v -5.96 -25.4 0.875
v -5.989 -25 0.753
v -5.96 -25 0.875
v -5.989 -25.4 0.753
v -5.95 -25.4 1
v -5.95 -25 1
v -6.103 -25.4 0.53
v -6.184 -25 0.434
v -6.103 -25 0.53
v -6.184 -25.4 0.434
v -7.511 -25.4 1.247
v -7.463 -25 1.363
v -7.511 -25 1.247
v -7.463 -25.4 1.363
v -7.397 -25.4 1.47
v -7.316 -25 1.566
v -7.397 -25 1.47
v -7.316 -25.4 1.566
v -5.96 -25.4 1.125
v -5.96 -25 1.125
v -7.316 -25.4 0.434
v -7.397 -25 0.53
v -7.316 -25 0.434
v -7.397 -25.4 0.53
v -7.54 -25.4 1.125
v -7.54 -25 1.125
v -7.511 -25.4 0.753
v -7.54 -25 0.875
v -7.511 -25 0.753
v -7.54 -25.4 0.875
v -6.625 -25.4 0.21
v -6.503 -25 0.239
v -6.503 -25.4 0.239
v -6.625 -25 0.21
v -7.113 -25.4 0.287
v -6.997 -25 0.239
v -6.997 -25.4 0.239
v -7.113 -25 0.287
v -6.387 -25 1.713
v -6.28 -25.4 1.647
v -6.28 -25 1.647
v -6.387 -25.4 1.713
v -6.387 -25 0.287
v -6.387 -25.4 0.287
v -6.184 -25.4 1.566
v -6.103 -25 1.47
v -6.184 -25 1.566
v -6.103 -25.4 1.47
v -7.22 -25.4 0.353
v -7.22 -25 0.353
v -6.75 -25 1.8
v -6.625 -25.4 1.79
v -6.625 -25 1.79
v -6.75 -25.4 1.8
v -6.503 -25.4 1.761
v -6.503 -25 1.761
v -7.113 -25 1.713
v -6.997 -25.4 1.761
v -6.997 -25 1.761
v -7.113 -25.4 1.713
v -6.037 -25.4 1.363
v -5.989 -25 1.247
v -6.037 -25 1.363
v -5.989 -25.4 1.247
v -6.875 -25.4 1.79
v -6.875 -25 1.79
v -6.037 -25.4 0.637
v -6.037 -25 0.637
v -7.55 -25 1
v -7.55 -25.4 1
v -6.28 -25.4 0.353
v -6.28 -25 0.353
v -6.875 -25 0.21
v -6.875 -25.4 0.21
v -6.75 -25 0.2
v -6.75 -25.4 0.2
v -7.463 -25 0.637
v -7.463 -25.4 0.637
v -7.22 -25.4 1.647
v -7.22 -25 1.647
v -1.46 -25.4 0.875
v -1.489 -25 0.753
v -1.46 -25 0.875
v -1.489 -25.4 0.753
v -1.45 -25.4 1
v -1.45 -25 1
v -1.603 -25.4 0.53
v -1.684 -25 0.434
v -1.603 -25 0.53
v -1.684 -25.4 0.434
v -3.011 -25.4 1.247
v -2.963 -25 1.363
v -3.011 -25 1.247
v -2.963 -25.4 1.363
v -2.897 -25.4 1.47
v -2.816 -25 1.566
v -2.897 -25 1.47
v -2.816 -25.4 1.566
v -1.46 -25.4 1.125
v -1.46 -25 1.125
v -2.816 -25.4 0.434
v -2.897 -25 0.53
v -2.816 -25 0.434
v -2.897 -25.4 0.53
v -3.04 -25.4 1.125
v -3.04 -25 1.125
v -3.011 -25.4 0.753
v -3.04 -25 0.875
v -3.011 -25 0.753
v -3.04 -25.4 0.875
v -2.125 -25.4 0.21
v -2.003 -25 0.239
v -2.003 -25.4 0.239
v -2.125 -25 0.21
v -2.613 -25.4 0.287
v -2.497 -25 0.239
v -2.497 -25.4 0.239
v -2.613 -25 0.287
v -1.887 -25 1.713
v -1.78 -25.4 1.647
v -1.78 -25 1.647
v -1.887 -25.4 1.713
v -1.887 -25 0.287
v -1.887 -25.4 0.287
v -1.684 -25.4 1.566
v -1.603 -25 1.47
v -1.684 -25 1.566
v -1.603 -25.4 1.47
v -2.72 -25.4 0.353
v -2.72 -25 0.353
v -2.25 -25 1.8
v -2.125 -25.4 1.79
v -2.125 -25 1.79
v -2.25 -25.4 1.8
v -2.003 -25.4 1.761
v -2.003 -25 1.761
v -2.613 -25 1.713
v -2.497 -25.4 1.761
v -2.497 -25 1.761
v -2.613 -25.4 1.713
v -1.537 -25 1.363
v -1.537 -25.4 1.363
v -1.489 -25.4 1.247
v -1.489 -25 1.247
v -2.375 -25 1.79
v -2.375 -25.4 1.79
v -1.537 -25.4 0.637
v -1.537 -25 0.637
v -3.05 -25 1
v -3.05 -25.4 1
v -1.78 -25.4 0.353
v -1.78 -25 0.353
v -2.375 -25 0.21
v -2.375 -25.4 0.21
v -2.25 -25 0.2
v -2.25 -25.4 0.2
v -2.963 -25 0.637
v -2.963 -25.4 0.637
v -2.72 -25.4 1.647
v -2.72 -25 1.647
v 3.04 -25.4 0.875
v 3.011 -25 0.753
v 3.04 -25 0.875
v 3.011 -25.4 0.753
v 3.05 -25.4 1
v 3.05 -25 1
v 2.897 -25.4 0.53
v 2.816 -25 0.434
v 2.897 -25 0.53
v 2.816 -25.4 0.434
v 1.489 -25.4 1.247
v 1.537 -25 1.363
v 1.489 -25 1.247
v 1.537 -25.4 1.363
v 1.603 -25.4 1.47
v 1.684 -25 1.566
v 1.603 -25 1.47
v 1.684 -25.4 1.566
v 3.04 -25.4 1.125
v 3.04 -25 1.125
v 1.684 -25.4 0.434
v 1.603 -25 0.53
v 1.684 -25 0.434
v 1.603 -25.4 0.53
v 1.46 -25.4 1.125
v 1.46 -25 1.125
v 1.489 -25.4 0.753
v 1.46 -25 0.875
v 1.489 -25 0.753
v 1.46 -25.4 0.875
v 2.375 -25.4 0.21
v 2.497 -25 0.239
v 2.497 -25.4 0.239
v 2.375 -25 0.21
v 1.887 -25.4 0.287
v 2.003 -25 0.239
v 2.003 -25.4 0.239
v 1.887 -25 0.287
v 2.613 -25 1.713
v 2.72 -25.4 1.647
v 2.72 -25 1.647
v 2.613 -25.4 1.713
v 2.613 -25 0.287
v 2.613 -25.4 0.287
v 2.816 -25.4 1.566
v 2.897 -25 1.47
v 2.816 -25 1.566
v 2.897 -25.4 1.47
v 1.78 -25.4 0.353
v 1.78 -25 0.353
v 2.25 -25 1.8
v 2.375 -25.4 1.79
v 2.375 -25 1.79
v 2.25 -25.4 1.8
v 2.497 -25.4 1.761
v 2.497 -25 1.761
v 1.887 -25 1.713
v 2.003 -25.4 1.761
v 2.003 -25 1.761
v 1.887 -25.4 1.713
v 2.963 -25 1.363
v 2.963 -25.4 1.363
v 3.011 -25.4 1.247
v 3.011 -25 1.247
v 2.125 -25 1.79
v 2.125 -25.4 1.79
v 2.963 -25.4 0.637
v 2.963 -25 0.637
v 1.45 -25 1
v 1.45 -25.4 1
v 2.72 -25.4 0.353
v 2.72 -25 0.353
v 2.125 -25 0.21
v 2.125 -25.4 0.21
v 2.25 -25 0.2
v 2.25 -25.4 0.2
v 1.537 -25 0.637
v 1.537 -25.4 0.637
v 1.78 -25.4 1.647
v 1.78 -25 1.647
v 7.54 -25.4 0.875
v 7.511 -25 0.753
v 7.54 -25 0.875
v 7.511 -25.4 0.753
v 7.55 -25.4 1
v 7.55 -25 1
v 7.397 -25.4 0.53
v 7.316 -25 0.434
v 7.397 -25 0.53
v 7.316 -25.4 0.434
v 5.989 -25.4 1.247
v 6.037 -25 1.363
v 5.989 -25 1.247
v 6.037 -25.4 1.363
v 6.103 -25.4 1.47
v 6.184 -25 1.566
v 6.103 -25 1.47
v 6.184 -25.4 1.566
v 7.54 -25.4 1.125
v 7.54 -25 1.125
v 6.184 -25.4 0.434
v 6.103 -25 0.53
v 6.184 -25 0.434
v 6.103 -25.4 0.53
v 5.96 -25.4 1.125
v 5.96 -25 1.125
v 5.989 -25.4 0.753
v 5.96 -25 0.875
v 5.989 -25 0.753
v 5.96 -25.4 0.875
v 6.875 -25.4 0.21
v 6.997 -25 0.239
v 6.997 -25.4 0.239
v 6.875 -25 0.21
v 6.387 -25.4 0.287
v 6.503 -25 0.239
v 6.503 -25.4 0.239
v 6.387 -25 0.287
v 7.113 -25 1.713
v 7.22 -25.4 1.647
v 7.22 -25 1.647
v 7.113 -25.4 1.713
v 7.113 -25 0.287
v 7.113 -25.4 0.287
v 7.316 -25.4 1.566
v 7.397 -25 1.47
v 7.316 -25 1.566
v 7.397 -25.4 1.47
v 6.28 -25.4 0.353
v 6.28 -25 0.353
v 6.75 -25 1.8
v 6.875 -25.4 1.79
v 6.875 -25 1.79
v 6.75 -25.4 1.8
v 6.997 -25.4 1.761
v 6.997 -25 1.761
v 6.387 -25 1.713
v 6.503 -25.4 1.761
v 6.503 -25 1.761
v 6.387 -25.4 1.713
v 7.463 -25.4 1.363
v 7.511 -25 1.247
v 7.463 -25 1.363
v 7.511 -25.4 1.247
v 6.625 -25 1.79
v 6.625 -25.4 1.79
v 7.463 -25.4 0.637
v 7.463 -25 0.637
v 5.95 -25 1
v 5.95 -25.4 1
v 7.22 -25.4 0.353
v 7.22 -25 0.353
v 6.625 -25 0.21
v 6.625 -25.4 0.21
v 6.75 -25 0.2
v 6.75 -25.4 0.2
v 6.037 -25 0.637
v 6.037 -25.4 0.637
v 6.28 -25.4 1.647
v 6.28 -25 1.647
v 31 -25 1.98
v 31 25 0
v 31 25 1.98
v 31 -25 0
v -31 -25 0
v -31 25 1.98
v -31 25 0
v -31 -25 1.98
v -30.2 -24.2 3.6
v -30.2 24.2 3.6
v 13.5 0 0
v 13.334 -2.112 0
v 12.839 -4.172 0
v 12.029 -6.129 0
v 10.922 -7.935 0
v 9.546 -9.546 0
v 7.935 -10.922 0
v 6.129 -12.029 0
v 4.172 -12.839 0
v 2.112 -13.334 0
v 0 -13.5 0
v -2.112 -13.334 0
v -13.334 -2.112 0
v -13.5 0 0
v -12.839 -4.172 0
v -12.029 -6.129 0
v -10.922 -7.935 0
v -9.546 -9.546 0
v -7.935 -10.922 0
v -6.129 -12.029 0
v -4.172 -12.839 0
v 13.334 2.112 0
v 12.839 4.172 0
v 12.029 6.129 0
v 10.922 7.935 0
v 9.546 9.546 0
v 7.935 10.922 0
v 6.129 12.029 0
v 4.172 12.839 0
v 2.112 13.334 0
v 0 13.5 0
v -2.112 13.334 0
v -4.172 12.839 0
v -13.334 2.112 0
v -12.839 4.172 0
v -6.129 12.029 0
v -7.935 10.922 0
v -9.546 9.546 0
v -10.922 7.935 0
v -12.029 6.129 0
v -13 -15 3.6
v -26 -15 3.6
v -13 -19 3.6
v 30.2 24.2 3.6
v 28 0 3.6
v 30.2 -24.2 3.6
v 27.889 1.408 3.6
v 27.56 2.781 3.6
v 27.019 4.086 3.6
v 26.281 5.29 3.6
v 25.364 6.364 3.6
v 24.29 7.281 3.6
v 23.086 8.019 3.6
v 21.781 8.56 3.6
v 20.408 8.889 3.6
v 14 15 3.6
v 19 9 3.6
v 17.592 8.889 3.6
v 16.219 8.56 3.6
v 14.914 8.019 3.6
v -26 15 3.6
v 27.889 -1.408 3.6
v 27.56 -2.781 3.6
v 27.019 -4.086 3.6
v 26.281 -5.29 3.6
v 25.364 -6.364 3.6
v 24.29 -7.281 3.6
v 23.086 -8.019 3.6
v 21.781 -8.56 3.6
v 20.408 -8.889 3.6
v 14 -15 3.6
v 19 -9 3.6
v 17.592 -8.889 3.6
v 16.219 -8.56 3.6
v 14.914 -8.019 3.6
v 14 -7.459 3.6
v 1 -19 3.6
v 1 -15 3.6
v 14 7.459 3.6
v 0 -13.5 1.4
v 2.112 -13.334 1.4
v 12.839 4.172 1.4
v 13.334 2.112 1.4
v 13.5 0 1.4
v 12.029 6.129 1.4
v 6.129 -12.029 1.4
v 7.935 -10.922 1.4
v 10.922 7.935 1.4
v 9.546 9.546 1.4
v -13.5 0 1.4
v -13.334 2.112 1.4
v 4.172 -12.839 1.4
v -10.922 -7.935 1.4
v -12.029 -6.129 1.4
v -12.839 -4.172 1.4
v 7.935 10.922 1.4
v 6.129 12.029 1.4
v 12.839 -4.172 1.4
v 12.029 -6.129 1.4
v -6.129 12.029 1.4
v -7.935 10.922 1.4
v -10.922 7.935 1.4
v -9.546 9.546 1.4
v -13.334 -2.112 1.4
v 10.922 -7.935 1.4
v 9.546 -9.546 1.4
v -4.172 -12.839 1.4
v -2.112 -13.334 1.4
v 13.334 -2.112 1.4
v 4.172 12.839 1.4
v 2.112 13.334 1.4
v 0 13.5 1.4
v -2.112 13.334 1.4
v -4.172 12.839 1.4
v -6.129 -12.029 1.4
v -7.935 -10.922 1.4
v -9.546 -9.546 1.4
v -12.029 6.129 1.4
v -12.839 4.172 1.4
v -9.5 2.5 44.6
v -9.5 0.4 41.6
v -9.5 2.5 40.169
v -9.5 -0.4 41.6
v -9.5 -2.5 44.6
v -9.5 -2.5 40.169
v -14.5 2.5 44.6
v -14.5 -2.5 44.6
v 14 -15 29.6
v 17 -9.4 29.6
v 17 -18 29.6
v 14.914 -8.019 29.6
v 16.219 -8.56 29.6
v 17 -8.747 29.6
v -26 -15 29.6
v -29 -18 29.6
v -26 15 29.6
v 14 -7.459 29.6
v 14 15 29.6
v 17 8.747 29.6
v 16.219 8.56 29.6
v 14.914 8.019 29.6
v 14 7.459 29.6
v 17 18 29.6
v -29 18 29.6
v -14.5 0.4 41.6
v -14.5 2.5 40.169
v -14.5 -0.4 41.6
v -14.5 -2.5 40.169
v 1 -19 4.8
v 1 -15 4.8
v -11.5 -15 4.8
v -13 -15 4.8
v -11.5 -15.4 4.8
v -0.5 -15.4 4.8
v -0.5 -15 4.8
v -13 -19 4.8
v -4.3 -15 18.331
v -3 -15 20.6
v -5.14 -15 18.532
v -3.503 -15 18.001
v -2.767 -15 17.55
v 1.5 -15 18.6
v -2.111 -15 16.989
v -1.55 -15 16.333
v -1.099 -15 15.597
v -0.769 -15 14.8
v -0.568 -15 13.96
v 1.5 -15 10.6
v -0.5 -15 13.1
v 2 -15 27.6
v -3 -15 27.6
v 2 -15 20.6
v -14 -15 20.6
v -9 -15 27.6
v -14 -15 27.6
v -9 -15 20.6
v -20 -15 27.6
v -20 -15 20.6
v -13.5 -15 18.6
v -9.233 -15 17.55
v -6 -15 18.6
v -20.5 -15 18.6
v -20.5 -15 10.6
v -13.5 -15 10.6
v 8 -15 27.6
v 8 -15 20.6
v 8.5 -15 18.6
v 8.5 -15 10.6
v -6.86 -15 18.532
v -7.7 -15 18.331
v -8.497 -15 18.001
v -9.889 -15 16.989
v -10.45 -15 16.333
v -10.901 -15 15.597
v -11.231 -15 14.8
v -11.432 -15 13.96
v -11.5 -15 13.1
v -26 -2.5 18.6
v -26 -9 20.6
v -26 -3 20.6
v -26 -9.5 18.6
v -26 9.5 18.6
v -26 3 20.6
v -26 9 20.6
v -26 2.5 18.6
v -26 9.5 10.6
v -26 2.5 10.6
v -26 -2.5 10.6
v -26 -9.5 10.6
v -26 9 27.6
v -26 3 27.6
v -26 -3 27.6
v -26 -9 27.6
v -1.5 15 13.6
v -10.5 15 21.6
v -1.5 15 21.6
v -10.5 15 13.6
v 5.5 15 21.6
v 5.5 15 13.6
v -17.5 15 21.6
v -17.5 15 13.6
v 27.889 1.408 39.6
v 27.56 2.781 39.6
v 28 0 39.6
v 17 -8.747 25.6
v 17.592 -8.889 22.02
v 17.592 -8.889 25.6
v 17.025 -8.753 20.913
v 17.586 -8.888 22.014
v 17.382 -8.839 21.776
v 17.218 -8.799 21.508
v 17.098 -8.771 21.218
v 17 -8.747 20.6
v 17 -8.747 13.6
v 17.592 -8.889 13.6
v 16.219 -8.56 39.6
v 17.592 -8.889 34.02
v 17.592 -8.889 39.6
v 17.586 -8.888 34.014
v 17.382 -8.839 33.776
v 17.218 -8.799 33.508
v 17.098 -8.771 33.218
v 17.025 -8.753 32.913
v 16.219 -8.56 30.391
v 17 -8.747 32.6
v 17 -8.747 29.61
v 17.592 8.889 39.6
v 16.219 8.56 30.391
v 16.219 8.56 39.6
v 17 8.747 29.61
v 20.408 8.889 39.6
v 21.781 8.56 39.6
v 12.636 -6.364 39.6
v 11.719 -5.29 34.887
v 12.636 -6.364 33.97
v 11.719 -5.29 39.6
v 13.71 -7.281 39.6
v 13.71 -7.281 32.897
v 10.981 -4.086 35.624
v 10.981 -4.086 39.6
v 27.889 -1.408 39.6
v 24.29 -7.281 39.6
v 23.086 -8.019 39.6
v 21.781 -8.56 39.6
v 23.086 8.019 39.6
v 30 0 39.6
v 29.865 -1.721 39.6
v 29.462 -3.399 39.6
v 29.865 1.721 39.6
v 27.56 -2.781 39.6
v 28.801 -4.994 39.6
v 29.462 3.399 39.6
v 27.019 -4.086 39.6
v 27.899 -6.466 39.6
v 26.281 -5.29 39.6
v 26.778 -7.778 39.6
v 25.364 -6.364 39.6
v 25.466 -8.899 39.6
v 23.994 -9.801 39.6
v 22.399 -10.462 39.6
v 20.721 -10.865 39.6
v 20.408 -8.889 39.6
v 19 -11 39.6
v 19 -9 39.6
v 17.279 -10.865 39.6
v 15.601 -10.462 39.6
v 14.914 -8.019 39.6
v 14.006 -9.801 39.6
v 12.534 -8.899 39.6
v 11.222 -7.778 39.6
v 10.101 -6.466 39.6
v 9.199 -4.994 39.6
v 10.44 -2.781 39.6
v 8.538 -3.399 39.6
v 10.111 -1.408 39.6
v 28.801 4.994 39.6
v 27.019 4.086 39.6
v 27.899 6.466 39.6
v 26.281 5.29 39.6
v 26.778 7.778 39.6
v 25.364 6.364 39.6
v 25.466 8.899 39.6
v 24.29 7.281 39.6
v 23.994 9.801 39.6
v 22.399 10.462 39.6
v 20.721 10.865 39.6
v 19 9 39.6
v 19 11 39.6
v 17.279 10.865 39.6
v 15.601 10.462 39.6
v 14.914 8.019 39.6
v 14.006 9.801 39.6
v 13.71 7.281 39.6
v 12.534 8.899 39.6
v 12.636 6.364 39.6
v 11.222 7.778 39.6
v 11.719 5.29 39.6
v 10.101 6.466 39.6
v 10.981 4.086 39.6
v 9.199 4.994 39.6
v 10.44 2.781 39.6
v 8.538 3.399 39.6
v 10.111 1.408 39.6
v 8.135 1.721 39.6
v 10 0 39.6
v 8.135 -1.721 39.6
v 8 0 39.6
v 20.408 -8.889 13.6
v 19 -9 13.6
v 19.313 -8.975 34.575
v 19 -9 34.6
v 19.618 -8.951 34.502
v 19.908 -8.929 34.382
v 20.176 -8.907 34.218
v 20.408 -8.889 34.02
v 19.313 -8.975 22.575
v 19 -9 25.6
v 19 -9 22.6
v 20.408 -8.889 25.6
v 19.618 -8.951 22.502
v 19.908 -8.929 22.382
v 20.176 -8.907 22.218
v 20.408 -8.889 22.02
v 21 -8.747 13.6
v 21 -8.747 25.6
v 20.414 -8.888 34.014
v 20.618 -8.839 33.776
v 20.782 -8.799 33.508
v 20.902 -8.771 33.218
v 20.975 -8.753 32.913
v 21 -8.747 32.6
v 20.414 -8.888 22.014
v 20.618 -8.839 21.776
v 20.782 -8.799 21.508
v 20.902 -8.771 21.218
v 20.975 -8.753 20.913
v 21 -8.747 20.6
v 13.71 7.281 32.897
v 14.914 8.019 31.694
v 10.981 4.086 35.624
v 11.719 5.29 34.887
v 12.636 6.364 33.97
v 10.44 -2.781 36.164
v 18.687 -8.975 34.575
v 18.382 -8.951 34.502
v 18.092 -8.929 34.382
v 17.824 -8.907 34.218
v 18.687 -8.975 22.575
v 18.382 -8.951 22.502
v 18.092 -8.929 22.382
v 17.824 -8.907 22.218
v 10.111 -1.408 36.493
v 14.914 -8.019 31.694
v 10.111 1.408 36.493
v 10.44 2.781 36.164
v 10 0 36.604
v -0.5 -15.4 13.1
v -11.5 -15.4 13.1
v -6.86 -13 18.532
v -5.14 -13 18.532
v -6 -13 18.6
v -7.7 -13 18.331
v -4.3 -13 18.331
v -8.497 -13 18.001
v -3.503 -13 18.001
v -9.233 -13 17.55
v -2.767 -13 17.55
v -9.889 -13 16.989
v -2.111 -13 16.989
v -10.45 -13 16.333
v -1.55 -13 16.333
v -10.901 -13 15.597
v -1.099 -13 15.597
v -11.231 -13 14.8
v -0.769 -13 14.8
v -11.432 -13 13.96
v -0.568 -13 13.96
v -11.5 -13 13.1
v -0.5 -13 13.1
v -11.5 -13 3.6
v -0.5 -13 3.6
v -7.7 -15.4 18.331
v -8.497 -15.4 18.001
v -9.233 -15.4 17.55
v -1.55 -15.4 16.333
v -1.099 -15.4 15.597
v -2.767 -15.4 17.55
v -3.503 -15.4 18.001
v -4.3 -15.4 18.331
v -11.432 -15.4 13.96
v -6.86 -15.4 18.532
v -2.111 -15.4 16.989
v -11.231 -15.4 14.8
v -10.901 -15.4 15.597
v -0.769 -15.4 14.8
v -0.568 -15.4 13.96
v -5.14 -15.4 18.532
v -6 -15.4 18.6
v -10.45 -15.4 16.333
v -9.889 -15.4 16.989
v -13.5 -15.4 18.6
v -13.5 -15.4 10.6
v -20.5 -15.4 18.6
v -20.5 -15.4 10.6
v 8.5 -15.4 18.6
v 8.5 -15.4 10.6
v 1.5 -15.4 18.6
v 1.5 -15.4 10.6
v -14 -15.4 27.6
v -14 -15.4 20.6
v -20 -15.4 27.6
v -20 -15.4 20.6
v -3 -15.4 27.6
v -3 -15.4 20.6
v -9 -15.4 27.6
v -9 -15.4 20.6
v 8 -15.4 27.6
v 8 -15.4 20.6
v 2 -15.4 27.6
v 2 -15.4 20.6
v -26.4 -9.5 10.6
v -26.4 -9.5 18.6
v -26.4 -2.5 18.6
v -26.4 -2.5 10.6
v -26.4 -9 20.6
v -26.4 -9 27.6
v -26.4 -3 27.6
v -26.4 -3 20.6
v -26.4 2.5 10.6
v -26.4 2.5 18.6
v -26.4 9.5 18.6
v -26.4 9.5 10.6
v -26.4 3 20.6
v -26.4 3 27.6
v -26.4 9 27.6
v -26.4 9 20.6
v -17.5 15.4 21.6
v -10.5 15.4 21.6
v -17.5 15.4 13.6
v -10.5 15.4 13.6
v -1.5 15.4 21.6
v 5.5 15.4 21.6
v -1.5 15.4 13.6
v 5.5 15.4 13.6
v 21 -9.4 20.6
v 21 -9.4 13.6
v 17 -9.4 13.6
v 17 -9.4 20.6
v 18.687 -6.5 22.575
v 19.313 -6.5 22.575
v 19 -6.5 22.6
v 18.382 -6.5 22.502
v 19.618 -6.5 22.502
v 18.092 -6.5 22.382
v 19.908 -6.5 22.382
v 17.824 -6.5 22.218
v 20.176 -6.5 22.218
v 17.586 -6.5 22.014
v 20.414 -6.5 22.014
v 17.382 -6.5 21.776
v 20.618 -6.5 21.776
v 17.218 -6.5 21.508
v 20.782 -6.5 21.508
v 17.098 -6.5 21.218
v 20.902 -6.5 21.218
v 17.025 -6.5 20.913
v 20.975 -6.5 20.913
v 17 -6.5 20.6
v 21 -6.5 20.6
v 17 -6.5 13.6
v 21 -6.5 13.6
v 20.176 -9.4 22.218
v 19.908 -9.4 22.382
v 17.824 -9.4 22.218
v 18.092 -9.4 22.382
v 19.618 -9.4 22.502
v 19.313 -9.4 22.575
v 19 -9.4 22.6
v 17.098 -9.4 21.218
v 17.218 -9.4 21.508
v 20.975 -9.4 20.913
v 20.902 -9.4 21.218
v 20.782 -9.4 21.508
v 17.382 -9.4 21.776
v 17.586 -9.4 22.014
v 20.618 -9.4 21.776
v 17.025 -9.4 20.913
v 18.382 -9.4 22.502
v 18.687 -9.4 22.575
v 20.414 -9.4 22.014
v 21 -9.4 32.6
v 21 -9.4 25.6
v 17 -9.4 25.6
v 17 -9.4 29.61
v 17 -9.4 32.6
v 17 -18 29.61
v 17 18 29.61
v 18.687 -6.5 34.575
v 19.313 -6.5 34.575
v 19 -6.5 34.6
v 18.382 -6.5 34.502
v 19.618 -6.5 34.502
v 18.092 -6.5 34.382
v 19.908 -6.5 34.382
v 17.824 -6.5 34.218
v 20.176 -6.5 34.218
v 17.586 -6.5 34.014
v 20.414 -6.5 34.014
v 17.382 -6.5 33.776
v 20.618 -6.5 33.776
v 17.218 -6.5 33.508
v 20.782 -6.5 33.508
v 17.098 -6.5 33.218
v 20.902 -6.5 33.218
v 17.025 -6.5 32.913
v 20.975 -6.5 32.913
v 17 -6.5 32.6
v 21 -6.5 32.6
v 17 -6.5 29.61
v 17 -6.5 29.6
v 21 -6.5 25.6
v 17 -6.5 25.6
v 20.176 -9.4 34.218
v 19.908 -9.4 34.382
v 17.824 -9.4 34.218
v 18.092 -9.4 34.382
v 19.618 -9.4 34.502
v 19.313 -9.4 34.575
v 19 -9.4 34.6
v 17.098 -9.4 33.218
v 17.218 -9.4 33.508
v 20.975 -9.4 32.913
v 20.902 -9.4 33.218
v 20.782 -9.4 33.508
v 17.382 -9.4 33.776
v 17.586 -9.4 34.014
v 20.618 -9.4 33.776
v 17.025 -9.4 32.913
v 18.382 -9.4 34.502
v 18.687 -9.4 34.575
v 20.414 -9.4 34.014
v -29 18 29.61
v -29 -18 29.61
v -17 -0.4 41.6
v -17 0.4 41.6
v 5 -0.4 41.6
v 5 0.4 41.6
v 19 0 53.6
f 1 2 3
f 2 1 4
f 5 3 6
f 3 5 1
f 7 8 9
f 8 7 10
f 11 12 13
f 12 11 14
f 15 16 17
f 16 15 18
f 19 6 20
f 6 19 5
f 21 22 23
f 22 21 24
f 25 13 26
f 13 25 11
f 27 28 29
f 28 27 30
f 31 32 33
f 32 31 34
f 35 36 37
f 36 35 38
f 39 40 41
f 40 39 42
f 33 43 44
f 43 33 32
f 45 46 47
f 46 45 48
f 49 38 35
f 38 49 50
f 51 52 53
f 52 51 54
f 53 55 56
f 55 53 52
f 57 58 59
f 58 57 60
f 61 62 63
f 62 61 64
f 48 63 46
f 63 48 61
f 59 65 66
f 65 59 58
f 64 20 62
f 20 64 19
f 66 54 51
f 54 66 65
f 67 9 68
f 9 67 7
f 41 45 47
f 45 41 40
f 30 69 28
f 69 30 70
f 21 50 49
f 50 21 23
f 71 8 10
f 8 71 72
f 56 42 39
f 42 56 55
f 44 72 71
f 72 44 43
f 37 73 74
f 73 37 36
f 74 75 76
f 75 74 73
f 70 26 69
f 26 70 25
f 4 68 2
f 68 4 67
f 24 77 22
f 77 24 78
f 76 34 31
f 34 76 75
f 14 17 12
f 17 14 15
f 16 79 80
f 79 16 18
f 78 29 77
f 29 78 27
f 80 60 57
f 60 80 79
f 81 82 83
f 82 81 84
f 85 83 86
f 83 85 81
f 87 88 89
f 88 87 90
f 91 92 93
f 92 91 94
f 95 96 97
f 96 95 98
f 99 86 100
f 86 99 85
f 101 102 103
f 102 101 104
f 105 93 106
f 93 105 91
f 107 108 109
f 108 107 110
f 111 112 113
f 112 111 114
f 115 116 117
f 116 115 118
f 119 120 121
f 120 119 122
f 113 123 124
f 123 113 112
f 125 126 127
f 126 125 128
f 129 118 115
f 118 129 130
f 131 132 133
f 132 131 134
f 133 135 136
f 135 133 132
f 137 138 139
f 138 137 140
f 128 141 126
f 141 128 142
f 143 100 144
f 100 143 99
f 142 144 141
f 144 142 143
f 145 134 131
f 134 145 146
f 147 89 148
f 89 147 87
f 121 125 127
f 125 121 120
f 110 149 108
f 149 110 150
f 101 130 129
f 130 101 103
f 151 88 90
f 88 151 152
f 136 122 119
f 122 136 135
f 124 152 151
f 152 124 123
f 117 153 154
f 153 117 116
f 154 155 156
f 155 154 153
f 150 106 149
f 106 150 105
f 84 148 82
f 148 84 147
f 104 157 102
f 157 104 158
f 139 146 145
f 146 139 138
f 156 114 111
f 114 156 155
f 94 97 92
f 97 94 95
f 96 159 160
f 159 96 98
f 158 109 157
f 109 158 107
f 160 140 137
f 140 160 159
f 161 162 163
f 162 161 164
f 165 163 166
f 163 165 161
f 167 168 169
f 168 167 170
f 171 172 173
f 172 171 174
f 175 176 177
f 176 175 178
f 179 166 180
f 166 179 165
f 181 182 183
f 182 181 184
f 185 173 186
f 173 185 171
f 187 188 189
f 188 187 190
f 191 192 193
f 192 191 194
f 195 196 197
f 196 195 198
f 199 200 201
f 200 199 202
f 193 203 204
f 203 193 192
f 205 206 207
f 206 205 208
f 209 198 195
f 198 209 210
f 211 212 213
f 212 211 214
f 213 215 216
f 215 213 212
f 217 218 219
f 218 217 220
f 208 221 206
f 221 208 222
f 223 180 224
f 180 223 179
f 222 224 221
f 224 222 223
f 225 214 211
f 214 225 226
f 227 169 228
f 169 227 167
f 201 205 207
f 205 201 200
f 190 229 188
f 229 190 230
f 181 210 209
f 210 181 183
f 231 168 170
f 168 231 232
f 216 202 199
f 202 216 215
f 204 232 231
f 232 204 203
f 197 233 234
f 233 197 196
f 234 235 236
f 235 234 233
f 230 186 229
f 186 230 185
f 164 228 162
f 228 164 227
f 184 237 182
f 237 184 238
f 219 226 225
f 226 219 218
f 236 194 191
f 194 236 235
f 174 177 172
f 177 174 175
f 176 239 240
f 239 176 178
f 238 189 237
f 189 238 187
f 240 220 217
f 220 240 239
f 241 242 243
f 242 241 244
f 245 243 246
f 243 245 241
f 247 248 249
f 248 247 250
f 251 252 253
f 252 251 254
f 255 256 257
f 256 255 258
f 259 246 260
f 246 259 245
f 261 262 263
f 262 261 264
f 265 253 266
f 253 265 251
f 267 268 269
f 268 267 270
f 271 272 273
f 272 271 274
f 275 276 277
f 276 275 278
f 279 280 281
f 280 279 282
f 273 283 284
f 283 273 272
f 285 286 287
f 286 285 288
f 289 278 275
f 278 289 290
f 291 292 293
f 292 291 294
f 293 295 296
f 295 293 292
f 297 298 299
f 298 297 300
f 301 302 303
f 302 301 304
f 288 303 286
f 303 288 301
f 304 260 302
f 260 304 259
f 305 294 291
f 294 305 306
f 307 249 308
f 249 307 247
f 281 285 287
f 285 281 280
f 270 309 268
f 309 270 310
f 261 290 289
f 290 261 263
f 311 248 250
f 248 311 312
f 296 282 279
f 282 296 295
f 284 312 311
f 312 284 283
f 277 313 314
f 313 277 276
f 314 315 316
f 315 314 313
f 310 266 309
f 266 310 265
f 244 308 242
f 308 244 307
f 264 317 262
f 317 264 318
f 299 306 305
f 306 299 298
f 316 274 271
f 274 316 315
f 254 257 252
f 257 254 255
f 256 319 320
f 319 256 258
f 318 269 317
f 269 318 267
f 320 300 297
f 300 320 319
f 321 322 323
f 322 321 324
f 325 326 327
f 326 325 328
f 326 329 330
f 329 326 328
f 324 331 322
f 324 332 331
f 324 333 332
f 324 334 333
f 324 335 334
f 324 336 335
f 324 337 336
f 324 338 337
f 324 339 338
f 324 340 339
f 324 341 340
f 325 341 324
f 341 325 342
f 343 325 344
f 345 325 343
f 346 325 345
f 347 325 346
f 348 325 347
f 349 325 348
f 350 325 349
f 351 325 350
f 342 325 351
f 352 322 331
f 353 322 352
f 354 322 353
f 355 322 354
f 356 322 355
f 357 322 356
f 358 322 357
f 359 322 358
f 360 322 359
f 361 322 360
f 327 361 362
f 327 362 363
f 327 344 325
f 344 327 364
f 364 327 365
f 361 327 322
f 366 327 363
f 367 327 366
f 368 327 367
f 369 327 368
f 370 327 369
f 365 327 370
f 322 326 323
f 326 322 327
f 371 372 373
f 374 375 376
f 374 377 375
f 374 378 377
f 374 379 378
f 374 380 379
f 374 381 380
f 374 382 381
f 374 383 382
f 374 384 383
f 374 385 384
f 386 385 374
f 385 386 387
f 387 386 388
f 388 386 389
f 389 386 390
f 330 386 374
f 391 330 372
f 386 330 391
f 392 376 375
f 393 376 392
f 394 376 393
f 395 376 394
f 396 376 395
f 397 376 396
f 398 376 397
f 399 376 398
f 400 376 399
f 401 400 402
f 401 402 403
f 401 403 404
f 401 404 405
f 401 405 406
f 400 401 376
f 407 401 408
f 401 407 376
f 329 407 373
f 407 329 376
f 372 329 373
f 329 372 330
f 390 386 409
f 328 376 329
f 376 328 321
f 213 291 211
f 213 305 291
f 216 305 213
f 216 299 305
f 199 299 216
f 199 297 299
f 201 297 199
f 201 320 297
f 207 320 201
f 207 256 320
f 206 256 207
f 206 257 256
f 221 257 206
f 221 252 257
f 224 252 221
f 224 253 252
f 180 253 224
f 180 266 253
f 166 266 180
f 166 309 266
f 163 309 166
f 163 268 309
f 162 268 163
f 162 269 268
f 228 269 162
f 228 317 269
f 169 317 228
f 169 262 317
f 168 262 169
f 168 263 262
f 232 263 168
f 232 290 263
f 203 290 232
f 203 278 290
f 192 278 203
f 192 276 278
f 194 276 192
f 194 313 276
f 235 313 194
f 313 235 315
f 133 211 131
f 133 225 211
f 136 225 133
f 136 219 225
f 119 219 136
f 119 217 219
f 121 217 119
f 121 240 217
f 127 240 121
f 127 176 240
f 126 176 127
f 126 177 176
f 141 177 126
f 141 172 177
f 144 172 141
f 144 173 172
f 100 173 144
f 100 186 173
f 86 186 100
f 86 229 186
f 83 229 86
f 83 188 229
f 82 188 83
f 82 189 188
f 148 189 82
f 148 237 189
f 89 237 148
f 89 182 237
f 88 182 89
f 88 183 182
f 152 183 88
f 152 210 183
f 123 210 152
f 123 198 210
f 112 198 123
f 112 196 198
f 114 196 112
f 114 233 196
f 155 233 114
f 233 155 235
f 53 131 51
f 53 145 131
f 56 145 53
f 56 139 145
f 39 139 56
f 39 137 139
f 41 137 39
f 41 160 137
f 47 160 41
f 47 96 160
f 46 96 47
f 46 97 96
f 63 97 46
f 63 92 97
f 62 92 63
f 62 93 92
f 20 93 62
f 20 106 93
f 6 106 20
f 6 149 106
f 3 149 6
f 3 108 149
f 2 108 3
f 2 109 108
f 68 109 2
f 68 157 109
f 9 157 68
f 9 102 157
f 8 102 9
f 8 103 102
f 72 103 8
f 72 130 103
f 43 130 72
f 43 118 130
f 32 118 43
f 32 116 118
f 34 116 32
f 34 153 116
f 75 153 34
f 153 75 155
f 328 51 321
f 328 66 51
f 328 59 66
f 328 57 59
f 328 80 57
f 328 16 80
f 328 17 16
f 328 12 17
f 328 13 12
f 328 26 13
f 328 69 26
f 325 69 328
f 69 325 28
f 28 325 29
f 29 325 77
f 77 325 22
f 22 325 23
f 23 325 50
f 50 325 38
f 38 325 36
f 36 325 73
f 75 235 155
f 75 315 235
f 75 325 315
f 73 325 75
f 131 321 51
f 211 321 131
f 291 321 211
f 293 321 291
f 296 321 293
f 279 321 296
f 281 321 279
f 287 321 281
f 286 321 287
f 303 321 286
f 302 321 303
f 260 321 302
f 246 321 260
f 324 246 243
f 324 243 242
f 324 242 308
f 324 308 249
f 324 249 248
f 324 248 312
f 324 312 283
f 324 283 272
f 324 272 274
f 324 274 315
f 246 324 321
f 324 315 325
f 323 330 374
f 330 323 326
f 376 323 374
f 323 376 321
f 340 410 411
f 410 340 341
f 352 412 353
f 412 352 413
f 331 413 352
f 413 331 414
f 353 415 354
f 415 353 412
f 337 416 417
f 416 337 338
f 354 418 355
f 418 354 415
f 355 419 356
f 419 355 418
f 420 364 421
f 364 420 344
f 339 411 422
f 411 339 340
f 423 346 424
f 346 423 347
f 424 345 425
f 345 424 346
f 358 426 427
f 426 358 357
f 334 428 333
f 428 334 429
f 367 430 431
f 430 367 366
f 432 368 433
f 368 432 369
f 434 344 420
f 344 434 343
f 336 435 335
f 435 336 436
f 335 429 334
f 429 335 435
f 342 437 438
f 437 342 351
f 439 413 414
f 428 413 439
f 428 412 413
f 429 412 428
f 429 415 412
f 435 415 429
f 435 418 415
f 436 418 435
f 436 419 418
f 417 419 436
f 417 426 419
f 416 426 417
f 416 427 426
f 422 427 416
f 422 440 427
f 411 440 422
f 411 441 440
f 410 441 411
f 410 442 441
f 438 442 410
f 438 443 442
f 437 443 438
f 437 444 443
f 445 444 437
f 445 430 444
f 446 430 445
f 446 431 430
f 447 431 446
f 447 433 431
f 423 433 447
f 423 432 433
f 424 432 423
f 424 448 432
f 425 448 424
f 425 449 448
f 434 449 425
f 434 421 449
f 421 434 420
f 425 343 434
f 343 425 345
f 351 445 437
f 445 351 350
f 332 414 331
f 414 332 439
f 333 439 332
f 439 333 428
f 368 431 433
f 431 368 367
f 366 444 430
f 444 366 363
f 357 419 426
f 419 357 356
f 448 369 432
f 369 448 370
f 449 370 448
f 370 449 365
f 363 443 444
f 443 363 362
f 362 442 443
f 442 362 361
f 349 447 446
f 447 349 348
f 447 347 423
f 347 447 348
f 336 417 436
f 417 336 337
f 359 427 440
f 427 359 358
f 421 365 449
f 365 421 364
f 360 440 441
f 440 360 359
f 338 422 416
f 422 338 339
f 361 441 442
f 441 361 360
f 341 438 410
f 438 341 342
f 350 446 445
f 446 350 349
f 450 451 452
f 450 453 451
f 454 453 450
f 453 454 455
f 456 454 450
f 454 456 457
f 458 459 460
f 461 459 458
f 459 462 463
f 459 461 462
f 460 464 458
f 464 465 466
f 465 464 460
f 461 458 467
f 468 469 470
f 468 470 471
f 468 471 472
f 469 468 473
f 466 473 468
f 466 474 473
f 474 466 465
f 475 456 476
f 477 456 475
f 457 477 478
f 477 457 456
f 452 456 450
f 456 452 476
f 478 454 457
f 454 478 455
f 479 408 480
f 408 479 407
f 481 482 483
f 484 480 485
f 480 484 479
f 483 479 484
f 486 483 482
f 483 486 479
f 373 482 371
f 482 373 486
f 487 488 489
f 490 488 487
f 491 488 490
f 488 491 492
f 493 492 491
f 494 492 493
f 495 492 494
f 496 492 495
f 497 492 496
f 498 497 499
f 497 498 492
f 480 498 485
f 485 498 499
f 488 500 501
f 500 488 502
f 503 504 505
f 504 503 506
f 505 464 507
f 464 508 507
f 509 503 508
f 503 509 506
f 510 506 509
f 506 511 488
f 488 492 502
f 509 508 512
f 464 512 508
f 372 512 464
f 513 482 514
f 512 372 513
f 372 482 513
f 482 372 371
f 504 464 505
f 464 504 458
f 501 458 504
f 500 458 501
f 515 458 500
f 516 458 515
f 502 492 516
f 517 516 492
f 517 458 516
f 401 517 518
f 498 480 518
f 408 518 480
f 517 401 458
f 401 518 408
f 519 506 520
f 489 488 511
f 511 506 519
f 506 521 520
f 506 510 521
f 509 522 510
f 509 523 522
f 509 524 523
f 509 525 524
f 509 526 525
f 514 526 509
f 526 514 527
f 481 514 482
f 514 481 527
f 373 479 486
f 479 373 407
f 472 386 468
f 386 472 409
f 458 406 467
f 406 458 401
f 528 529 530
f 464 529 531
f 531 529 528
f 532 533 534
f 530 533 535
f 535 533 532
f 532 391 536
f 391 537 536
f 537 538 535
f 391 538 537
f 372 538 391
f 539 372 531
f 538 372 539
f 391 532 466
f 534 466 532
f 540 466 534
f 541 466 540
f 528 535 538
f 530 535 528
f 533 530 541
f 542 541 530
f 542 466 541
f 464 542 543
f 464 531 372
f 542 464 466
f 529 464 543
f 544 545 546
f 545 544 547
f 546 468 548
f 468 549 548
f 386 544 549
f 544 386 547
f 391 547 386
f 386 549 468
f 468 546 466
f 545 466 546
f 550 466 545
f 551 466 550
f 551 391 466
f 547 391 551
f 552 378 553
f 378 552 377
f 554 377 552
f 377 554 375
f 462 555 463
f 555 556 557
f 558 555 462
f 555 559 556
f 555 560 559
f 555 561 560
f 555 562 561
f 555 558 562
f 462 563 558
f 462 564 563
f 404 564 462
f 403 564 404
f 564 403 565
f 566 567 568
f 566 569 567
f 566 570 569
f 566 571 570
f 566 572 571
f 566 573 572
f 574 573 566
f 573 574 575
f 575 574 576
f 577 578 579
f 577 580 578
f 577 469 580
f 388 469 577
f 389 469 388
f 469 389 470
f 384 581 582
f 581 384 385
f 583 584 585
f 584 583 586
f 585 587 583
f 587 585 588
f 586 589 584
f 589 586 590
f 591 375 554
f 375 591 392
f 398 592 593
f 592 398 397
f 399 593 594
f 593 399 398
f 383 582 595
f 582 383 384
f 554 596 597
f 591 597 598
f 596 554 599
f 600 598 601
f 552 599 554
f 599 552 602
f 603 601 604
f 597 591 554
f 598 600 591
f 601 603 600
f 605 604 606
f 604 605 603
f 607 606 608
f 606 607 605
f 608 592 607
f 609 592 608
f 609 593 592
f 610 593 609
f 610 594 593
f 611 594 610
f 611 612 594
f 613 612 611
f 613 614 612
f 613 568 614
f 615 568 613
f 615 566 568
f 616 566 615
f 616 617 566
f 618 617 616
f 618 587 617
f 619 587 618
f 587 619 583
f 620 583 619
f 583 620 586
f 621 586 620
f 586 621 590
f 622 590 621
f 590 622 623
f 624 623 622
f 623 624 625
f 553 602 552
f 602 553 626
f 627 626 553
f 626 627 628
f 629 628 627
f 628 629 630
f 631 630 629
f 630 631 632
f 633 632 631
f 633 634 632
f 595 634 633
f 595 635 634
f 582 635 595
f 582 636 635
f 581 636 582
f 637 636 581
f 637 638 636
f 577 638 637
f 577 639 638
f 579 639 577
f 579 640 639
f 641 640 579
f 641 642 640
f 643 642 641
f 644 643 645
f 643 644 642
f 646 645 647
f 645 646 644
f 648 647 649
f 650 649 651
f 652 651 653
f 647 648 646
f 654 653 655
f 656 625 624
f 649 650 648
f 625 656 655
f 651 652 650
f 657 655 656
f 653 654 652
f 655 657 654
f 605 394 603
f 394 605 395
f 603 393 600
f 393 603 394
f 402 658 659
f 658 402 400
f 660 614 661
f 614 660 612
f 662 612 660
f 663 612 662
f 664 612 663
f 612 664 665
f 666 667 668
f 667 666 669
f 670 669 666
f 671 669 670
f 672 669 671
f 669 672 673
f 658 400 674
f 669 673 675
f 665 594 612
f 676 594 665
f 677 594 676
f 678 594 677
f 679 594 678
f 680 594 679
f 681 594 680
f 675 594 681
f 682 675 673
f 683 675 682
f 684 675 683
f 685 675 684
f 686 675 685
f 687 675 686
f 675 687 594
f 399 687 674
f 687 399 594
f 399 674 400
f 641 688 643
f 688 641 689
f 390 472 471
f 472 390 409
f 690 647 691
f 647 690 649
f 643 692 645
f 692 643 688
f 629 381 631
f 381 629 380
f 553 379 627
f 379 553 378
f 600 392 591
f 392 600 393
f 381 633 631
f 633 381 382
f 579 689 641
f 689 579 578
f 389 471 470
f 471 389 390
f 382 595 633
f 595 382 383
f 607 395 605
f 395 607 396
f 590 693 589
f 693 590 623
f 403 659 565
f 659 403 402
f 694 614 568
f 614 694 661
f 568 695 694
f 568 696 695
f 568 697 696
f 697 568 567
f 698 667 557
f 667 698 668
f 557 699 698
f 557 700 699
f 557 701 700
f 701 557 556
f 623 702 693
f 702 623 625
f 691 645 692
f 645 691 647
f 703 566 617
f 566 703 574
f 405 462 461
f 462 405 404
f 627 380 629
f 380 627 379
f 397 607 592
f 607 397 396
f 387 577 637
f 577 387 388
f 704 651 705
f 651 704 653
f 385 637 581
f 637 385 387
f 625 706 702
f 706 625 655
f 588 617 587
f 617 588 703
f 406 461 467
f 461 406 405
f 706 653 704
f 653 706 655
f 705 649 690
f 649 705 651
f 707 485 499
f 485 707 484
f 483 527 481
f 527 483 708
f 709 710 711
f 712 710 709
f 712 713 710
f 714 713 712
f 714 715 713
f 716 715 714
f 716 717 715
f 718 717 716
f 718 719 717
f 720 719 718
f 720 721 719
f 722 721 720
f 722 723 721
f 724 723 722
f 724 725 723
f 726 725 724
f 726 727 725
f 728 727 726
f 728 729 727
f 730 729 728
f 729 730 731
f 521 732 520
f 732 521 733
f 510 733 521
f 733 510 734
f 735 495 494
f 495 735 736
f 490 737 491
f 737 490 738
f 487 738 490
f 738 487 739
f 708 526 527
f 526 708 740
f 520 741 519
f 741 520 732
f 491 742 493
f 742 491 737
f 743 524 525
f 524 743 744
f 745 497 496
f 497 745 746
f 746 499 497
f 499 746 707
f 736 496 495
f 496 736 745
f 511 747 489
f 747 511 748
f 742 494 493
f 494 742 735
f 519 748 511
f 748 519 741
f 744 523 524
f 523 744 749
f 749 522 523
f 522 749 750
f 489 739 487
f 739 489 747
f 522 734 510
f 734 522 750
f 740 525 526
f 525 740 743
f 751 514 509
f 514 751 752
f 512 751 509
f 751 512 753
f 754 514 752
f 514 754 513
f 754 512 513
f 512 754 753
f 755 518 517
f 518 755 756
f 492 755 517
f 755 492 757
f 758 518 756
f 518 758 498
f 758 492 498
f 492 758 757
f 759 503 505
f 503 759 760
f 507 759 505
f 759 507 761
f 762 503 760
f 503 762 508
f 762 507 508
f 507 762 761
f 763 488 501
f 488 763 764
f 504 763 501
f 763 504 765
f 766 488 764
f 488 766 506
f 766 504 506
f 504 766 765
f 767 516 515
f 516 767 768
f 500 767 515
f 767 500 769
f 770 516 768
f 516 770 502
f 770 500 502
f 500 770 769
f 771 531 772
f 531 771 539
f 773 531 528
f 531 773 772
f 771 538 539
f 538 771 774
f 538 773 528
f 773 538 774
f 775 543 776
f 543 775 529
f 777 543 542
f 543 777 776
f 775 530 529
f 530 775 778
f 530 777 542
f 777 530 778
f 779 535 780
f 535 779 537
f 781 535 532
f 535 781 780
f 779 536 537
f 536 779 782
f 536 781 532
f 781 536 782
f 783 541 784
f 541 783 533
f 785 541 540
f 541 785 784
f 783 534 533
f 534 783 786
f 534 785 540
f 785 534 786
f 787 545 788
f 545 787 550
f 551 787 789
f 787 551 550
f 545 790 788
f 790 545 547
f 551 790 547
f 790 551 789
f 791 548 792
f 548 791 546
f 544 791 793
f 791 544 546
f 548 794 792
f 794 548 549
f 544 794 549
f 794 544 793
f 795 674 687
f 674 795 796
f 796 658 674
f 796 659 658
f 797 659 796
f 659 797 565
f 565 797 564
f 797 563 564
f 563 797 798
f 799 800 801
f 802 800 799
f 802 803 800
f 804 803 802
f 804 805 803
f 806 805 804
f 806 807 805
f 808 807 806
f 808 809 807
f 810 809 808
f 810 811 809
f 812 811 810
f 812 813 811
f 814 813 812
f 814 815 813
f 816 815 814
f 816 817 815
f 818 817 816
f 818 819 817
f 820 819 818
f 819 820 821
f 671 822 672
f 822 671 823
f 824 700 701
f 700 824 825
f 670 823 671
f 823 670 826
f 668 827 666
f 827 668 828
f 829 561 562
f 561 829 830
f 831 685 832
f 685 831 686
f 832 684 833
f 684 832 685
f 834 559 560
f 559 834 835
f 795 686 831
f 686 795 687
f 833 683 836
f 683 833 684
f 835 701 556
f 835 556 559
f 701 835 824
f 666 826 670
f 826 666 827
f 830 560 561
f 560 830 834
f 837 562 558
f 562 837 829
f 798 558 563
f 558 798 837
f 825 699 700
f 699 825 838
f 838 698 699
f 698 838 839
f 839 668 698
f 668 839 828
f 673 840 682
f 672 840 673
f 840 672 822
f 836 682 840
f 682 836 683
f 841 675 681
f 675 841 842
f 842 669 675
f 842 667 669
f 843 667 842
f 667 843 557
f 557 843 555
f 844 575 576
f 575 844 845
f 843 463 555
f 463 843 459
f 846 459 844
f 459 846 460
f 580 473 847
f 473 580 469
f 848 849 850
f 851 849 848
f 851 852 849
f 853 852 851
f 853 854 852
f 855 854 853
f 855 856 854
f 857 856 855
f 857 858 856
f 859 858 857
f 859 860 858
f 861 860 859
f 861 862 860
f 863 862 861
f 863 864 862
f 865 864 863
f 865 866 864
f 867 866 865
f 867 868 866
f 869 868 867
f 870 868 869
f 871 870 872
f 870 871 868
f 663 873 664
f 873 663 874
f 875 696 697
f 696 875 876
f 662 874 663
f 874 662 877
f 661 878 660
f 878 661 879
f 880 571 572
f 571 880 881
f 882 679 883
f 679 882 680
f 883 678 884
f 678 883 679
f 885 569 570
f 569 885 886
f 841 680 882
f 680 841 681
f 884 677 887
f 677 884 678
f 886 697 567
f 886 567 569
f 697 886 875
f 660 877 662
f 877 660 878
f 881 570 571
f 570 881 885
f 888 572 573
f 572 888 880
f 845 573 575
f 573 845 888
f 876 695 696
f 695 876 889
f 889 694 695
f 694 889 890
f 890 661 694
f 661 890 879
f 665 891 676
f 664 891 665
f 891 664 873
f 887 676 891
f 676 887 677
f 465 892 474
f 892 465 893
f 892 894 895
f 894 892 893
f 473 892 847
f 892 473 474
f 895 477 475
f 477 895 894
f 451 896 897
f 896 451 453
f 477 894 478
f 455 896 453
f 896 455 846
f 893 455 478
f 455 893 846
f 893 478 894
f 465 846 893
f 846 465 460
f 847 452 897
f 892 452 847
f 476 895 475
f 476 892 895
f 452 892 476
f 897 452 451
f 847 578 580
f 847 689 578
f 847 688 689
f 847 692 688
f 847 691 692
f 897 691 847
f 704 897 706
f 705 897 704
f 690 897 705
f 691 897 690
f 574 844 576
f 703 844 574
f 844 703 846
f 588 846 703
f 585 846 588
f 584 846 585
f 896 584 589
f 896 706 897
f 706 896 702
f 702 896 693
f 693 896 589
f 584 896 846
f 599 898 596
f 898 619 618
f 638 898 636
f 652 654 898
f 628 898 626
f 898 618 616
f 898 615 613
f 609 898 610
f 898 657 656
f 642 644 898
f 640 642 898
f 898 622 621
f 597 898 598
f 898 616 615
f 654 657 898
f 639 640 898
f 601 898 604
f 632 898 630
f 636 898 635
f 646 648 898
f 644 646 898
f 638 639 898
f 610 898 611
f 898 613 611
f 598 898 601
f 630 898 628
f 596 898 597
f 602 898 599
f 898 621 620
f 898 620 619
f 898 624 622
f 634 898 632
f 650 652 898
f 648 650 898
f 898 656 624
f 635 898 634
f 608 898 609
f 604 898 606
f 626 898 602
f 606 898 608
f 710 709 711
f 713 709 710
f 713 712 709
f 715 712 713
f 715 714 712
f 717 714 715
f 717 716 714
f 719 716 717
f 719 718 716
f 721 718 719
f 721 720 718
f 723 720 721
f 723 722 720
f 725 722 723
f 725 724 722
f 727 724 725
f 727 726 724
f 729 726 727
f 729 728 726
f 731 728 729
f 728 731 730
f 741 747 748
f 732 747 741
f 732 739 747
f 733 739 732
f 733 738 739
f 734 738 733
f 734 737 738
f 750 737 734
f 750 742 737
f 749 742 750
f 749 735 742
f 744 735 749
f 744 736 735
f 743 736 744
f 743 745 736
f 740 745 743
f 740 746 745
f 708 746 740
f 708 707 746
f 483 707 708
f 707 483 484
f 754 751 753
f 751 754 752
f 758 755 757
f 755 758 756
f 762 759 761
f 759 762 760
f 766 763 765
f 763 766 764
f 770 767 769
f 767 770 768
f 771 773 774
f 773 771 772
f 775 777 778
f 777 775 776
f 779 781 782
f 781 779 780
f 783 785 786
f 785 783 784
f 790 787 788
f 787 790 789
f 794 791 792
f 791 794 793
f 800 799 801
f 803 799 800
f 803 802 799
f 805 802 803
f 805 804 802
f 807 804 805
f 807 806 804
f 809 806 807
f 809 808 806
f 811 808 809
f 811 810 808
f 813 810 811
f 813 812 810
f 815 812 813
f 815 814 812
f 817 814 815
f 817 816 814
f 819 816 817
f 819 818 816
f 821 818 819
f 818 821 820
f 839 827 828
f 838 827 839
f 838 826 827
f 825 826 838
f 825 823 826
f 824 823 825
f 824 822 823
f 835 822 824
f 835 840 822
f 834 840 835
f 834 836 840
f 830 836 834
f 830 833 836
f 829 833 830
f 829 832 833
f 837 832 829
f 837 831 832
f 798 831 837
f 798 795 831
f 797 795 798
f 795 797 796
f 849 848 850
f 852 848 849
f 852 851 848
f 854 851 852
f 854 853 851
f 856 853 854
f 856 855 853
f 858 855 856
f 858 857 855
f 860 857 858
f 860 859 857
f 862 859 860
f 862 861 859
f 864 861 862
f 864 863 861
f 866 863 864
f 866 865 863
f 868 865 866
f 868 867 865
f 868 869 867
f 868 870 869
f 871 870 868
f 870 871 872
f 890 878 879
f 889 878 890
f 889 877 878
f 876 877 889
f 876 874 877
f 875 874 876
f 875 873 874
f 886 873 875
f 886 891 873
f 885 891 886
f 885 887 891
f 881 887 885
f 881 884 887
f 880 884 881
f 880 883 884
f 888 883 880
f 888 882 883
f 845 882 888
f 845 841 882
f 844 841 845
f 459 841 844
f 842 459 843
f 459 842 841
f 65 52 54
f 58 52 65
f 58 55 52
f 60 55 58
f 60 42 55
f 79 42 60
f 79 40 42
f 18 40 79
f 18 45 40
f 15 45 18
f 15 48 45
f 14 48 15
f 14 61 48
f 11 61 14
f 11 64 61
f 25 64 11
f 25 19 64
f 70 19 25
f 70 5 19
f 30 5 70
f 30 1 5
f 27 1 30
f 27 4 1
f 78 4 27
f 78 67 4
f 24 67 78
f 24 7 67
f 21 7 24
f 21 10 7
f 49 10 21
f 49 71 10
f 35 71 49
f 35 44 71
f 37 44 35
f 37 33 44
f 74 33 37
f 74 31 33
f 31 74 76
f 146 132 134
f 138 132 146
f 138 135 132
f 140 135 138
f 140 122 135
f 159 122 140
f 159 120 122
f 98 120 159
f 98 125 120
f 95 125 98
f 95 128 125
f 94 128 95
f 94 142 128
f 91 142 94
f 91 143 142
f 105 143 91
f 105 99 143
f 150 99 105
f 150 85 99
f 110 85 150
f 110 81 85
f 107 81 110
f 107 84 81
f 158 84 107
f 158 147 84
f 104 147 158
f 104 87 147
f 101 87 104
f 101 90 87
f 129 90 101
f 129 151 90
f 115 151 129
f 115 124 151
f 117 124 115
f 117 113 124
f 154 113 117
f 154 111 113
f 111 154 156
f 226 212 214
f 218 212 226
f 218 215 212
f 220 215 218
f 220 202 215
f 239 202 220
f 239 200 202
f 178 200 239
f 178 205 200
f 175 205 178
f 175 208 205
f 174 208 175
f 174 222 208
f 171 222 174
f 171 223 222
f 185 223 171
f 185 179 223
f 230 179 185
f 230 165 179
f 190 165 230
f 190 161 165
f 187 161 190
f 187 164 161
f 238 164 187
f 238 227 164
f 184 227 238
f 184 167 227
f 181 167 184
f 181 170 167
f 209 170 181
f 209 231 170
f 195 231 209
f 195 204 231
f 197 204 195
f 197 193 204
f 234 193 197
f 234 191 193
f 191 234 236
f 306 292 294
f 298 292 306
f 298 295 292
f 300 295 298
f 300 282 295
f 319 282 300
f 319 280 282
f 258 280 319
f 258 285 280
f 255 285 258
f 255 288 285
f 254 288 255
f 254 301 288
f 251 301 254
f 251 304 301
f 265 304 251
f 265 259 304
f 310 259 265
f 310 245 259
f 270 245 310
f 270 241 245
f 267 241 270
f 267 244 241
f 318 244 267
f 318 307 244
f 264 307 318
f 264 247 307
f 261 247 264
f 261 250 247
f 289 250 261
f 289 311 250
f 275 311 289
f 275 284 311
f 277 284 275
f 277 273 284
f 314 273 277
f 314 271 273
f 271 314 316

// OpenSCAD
// file: lib.scad
// BDL Pets - gemeinsame Bausteine fuer die 5 Haus-Stufen
//
// Alle Haeuser sind in genau 4 Farbslots aufgeteilt (Multicolor-Druck, z.B. Bambu AMS / Prusa MMU):
//   1 Stein/Sockel   2 Waende   3 Dach   4 Akzente (Tueren, Fenster, Pfosten, Stufen-Punkte)
// Die Teile ueberlappen nicht (Oeffnungen werden aus der einen Farbe geschnitten und in der anderen gefuellt),
// jeder Farbslot laesst sich einzeln als STL exportieren:  openscad -D part=1 -o x_c1.stl house-1-huette.scad
//   part = 0 -> Vorschau in Farbe, 1..4 -> nur dieser Farbslot
//
// Unten (Sockel) ist mittig eine runde Ausnehmung fuer einen NFC-Sticker (Durchmesser 25 mm) ausgespart:
// Sticker von unten einkleben, buendig mit der Unterseite, 2.2 mm Kunststoff darueber (Lesen durch das Haus).

$fn = 40;

PH = 3.6;           // Sockelhoehe (mm)
NFC_D = 27;         // Ausnehmung: 25 mm Sticker + Spiel
NFC_DEPTH = 1.4;    // Tiefe von unten (NTAG-Sticker ~0.3-0.6 mm dick + Kleber) -> Restdecke = PH - NFC_DEPTH
PALETTE = ["#8c9097", "#eadfc4", "#a5432f", "#33415f"];

module pc(i, part) {
    if (part == 0) color(PALETTE[i - 1]) children();
    else if (part == i) children();
}

// ---------------------------------------------------------------- Sockel (Farbe 1)
module plinth(w, d, tier) {
    difference() {
        hull() {
            translate([-w / 2, -d / 2, 0]) cube([w, d, PH * 0.55]);
            translate([-w / 2 + 0.8, -d / 2 + 0.8, 0]) cube([w - 1.6, d - 1.6, PH]);
        }
        translate([0, 0, -0.01]) cylinder(d = NFC_D, h = NFC_DEPTH + 0.01);   // NFC-Sticker
        tier_dots(w, d, tier, false);
    }
}

// Stufen-Punkte an der Sockel-Vorderseite: 1 Punkt = Huette ... 5 Punkte = Villa (Farbe 4 fuellt sie)
module tier_dots(w, d, tier, fill) {
    for (i = [0 : tier])
        translate([(i - tier / 2) * 4.5, -d / 2 - (fill ? 0.4 : 1), 1.0])
            rotate([-90, 0, 0]) cylinder(d = 1.6, h = fill ? 1.4 : 2);
}

// ---------------------------------------------------------------- Koerper
module box(w, d, h, z0, cx = 0, cy = 0) {
    translate([cx - w / 2, cy - d / 2, z0]) cube([w, d, h]);
}

// Satteldach, First entlang Y (Giebel zeigt nach vorn)
module gable(w, d, h, z0, over, cx = 0, cy = 0) {
    translate([cx, cy + (d + 2 * over) / 2, z0]) rotate([90, 0, 0])
        linear_extrude(d + 2 * over) polygon([[-w / 2 - over, 0], [w / 2 + over, 0], [0, h]]);
}

// Walmdach, First entlang X
module hip(w, d, h, z0, over, ridge, cx = 0, cy = 0) {
    hull() {
        translate([cx - w / 2 - over, cy - d / 2 - over, z0]) cube([w + 2 * over, d + 2 * over, 0.01]);
        translate([cx - ridge / 2, cy - 0.4, z0 + h - 0.01]) cube([ridge, 0.8, 0.01]);
    }
}

// ---------------------------------------------------------------- Oeffnungen (Tueren/Fenster)
// Ursprung = Unterkante Mitte, ragt von der Wandflaeche (y=0) nach innen (+y).
// fill=false: Schneidkoerper (steht 1 mm ueber), fill=true: Einsatz aus Farbe 4 (steht 0.4 mm vor)
module opening(w, h, d = 2, arch = false, fill = false) {
    out = fill ? 0.4 : 1;
    translate([0, -out, 0]) {
        if (arch) {
            translate([-w / 2, 0, 0]) cube([w, out + d, h - w / 2]);
            translate([0, 0, h - w / 2]) rotate([-90, 0, 0]) cylinder(d = w, h = out + d);
        } else {
            translate([-w / 2, 0, 0]) cube([w, out + d, h]);
        }
    }
}

// Auf eine Wand setzen. `face` = Abstand der Wandflaeche von der Mitte
module on_front(x, z, face) { translate([x, -face, z]) children(); }
module on_back(x, z, face) { translate([x, face, z]) rotate([0, 0, 180]) children(); }
module on_left(y, z, face) { translate([-face, y, z]) rotate([0, 0, -90]) children(); }
module on_right(y, z, face) { translate([face, y, z]) rotate([0, 0, 90]) children(); }

module on_side(k, y, z, face) {   // k = 0 links, 1 rechts
    if (k == 0) on_left(y, z, face) children();
    else on_right(y, z, face) children();
}
// main file
// Stufe 4: Herrenhaus - 4 Plaetze, Zufriedenheit -12/Tag. Zwei Stockwerke, runder Turm mit Kegeldach, Freitreppe.
include <lib.scad>

H4_P = [62, 50];
H4_CX = -6;                       // Hauptbau ist nach links verschoben, rechts steht der Turm
H4_W = 40; H4_D = 30; H4_H = 26; H4_RH = 12; H4_OV = 3;
H4_TX = 19; H4_TR = 9; H4_TH = 36;

module h4_openings(fill) {
    z = PH;
    on_front(H4_CX, z, H4_D / 2) opening(11, 15, 2, true, fill);
    for (x = [H4_CX - 11, H4_CX + 11]) on_front(x, z + 7, H4_D / 2) opening(7, 8, 2, false, fill);
    for (x = [H4_CX - 11, H4_CX, H4_CX + 11]) on_front(x, z + 17, H4_D / 2) opening(6, 7, 2, false, fill);
    for (y = [-6, 6]) {
        on_left(y, z + 7, H4_W / 2 - H4_CX) opening(7, 8, 2, false, fill);
        on_left(y, z + 17, H4_W / 2 - H4_CX) opening(6, 7, 2, false, fill);
    }
    for (x = [H4_CX - 8, H4_CX + 8]) on_back(x, z + 10, H4_D / 2) opening(7, 8, 2, false, fill);
    // Turm
    for (zz = [10, 22]) on_front(H4_TX, z + zz, H4_TR) opening(4, 9, 2.5, true, fill);
}

module h4_chimney() { box(5, 5, 15, PH + H4_H, H4_CX - 6, 0); }

module house4(part = 0) {
    pc(1, part) {
        plinth(H4_P[0], H4_P[1], 3);
        h4_chimney();
        box(14, 4, 1.2, PH, H4_CX, -17);   // Freitreppe
    }
    pc(2, part) difference() {
        union() {
            box(H4_W, H4_D, H4_H, PH, H4_CX, 0);
            translate([H4_TX, 0, PH]) cylinder(r = H4_TR, h = H4_TH);
        }
        h4_openings(false);
    }
    pc(3, part) {
        difference() {
            hip(H4_W, H4_D, H4_RH, PH + H4_H, H4_OV, 22, H4_CX, 0);
            h4_chimney();
        }
        translate([H4_TX, 0, PH + H4_TH]) cylinder(r1 = 11, r2 = 0, h = 14);
    }
    pc(4, part) { h4_openings(true); tier_dots(H4_P[0], H4_P[1], 3, true); }
}

part = 0;
house4(part);
